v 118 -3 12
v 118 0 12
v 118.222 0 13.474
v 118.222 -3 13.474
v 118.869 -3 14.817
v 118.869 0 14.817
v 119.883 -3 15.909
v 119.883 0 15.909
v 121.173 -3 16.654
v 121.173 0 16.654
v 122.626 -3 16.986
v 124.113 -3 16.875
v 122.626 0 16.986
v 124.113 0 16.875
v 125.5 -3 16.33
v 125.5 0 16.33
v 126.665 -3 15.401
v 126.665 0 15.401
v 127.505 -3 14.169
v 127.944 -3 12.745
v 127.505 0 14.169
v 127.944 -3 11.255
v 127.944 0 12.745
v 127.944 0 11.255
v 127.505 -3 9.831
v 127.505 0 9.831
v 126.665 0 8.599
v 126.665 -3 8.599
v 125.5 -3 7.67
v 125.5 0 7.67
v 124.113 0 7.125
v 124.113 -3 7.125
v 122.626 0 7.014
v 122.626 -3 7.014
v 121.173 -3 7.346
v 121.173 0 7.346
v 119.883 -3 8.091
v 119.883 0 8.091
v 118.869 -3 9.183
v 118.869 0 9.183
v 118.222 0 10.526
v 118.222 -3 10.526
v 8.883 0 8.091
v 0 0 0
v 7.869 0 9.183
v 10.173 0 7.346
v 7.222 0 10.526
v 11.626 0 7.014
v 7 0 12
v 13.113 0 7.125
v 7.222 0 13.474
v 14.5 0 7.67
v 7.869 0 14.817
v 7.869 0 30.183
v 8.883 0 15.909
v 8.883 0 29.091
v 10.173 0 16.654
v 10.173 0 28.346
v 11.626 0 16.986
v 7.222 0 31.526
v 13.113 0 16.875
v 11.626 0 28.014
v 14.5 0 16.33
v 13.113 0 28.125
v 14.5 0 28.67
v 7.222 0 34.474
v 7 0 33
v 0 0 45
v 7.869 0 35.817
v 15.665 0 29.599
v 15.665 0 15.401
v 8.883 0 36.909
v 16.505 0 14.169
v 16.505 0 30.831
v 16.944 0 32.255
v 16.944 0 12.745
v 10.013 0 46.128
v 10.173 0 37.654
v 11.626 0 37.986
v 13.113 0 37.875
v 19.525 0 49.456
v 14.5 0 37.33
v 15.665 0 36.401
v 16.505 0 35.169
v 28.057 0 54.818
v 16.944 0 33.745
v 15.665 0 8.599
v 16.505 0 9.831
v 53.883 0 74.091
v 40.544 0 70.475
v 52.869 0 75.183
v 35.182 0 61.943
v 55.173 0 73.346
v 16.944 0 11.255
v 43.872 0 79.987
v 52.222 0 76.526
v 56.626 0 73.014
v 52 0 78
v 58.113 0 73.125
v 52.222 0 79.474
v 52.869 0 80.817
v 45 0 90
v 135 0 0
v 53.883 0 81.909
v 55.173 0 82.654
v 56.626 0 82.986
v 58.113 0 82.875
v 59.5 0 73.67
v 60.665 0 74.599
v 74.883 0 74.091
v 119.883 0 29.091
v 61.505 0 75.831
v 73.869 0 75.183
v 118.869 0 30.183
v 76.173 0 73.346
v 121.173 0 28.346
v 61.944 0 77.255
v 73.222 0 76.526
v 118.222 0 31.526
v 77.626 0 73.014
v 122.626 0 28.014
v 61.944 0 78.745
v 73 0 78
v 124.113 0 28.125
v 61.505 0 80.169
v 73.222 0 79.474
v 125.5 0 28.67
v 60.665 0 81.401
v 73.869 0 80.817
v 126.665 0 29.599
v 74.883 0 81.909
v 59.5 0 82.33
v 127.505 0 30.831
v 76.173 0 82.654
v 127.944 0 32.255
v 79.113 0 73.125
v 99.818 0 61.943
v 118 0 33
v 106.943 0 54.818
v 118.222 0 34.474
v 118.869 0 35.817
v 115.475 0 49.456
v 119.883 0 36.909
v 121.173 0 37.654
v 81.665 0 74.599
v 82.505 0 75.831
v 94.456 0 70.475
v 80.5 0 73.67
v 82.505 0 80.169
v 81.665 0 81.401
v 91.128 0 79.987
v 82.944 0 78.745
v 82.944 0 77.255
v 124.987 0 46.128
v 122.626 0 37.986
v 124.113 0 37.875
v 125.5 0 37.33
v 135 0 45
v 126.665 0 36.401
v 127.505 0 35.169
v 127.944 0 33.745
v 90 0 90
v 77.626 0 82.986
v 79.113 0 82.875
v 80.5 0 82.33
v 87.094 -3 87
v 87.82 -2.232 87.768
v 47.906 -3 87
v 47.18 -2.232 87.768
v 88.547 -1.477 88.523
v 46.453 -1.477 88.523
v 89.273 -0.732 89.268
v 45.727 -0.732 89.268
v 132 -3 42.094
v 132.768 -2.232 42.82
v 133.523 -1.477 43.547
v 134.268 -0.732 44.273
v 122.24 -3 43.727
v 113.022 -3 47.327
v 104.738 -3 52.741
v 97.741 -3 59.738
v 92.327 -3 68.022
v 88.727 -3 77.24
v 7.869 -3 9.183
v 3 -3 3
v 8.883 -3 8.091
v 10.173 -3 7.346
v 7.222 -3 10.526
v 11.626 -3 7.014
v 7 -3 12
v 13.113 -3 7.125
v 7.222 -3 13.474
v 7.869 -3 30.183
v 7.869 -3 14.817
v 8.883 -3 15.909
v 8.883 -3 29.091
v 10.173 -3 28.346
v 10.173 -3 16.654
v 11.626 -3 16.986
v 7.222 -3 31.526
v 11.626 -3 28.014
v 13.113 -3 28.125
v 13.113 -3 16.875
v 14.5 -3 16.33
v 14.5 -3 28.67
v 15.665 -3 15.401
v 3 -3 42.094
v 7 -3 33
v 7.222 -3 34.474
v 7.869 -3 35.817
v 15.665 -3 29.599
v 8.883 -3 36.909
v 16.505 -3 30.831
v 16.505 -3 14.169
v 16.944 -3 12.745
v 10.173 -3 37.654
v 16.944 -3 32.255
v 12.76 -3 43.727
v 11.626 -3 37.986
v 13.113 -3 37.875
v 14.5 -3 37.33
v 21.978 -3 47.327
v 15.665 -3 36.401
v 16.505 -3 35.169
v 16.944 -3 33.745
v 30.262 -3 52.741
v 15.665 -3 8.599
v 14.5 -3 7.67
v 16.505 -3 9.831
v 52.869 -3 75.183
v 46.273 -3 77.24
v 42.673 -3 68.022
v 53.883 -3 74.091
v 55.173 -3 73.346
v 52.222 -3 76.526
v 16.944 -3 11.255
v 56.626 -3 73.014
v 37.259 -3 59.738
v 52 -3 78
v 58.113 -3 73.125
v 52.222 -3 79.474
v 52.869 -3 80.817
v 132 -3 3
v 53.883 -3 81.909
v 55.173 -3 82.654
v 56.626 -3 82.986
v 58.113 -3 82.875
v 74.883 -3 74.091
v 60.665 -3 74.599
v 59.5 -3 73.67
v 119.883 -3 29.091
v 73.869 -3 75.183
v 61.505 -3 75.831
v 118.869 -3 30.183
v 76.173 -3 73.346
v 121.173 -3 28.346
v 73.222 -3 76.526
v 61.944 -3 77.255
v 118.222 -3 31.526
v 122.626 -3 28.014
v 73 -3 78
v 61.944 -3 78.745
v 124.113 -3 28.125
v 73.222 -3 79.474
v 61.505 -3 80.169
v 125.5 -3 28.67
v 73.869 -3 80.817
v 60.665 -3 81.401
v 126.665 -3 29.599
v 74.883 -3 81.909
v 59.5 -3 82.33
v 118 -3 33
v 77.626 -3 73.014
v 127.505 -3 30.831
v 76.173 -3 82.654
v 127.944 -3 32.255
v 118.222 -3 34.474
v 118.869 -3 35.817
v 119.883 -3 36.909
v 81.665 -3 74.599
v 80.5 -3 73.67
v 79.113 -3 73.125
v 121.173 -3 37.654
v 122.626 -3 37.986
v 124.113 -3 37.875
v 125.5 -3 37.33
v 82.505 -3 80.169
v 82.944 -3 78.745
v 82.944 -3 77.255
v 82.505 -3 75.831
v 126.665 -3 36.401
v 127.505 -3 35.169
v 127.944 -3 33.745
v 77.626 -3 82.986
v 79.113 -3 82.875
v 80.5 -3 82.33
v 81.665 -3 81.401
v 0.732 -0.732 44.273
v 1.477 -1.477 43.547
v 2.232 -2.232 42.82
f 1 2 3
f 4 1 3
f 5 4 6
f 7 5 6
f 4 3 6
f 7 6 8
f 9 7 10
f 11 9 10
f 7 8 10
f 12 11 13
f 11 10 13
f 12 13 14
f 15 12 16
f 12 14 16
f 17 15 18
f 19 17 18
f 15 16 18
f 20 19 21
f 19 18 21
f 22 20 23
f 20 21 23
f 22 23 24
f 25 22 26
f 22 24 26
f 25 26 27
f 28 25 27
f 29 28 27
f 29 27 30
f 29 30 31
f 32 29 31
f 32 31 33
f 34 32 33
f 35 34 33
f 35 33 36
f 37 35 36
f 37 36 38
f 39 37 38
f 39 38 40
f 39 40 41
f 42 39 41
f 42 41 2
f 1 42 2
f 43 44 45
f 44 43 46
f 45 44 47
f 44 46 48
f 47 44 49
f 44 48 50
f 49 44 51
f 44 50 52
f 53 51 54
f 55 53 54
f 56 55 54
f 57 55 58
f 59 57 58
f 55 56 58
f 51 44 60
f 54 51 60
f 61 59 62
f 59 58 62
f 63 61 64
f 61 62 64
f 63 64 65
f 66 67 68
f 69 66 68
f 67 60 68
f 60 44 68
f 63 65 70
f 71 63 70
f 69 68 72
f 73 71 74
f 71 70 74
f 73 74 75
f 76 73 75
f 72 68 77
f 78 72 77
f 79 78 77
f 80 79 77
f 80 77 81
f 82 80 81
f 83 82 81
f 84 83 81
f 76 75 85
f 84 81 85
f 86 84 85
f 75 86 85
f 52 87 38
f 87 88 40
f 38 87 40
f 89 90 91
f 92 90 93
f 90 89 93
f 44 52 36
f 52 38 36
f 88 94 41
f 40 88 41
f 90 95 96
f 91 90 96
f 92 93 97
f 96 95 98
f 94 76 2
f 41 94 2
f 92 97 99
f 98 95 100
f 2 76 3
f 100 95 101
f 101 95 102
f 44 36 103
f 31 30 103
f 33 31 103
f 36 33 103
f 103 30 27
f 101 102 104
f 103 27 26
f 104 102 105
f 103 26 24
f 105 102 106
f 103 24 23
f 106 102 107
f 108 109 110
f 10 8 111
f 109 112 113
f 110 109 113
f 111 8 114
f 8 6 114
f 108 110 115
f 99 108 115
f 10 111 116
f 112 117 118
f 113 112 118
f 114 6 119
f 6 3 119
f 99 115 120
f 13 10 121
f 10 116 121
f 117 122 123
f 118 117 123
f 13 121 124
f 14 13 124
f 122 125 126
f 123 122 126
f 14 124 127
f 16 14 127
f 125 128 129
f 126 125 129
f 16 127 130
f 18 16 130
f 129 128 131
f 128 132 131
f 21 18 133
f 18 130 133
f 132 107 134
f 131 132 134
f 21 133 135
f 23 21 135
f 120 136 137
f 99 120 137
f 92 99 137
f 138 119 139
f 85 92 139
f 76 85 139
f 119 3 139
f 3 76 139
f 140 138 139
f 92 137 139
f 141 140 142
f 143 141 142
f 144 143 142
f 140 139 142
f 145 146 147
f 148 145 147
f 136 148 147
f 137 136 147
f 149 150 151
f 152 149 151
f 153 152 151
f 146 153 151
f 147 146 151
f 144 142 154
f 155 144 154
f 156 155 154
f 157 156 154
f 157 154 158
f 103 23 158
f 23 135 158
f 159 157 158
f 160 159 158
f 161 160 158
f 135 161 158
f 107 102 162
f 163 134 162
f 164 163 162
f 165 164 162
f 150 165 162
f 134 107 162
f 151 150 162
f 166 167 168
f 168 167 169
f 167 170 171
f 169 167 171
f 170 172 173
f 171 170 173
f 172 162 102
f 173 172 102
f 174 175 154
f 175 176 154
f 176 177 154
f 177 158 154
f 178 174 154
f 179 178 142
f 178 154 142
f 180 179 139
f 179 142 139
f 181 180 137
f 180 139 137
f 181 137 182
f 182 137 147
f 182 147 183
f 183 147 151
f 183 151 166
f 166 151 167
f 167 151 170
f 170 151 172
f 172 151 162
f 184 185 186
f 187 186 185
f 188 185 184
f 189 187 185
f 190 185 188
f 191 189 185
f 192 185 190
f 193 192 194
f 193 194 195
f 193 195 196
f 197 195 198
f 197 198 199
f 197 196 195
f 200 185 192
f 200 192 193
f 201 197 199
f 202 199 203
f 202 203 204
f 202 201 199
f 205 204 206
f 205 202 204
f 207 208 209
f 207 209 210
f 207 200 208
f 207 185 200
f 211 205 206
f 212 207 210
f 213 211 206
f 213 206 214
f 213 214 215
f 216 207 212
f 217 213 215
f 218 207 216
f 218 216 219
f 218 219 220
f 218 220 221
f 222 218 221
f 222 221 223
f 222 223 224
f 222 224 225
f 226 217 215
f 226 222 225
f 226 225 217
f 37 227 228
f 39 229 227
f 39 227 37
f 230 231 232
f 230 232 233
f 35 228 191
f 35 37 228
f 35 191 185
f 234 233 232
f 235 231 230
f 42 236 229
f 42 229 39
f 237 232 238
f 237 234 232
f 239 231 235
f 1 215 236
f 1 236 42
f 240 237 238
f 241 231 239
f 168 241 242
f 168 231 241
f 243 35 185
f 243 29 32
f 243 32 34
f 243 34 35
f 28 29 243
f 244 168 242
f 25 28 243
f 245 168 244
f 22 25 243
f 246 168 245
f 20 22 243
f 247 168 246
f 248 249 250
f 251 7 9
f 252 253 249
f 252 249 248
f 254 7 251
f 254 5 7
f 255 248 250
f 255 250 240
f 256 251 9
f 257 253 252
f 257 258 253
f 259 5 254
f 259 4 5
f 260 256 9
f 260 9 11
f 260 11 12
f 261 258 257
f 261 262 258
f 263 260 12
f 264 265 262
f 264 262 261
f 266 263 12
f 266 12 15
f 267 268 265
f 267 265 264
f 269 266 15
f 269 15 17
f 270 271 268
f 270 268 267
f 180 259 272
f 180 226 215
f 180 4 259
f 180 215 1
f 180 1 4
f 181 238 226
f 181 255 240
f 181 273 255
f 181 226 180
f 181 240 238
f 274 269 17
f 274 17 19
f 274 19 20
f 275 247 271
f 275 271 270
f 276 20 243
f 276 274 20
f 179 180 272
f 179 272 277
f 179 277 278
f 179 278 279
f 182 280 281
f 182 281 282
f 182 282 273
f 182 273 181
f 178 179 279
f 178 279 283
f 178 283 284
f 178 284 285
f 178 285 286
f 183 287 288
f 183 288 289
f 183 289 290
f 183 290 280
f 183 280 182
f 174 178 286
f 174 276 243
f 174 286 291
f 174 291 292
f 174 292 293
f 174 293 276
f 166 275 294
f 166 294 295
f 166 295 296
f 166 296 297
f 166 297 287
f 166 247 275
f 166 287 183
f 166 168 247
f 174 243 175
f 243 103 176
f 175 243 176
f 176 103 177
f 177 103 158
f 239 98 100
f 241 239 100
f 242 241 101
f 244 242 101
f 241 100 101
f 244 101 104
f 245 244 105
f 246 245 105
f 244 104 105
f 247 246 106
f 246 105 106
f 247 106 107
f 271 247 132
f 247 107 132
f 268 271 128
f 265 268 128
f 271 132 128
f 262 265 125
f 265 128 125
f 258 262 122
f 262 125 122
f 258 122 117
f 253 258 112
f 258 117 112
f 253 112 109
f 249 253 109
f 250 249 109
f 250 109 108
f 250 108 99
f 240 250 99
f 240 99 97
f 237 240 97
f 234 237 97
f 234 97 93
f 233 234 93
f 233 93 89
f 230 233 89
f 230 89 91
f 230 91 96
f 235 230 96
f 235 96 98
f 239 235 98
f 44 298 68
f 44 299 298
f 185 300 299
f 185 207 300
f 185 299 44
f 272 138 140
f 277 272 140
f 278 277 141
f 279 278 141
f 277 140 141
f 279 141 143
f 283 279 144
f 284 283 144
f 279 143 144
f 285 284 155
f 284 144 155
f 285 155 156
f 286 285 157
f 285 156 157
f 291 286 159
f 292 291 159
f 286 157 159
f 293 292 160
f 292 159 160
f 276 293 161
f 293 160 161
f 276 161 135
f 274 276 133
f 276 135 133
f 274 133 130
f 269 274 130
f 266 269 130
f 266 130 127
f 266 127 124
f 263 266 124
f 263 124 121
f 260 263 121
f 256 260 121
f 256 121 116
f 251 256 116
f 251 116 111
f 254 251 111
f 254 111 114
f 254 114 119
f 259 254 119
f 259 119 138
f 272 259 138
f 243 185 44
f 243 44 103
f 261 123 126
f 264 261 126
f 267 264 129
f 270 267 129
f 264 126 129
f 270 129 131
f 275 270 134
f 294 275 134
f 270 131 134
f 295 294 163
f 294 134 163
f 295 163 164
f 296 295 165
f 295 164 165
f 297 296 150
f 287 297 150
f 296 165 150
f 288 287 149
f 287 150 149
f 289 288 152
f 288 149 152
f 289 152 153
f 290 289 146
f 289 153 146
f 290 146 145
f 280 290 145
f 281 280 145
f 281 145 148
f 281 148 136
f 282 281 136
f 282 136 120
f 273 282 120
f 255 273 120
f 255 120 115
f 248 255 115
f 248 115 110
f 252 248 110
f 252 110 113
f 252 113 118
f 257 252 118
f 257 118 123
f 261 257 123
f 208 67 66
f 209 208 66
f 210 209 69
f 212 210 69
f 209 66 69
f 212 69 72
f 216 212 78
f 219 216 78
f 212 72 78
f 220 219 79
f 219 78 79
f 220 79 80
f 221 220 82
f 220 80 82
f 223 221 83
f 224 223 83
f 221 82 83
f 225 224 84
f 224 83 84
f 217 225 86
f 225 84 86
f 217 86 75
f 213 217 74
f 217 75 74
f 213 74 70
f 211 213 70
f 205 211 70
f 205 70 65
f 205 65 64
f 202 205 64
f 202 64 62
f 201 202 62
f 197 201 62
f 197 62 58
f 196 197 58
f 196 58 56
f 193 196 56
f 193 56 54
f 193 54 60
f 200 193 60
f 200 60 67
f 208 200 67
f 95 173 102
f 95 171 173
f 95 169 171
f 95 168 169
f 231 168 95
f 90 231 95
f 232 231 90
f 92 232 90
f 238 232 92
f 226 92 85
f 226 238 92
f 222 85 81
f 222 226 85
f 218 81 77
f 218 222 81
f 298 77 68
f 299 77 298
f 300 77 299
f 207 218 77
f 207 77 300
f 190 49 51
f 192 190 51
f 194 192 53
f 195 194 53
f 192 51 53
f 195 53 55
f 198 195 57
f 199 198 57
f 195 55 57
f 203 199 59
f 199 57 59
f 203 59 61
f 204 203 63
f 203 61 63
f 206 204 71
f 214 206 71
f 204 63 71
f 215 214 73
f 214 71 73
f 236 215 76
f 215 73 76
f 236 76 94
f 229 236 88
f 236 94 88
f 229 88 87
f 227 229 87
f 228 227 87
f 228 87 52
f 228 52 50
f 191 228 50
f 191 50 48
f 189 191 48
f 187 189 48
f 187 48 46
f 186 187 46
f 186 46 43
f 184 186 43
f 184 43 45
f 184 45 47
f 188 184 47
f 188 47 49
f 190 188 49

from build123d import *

# Parameters (mm, degrees)
F1_DEPTH = 3
F3_D     = 10
F3_DEPTH = 9
F3_TIP   = 3.0043030951
F4_SIZE  = 2.99999


# Not quite as in the source:
# - a fillet or chamfer is up to 0.001 mm smaller than in the source, because OpenCascade refuses the exact size


with BuildPart() as f1:
    # F0 (on Front) → F1 (new body)
    with BuildSketch(Plane.XZ):
        with BuildLine():
            Line((0, 45), (0, 0))
            Line((0, 0), (135, 0))
            Line((135, 0), (135, 45))
            ThreePointArc((135, 45), (103.1801948466, 58.1801948466), (90, 90))
            Line((90, 90), (45, 90))
            ThreePointArc((45, 90), (31.8198051534, 58.1801948466), (0, 45))
        make_face()
    extrude(amount=F1_DEPTH)

    # F3
    with Locations(Plane.XZ.offset(3)):
        with Locations((57, 78), (78, 78), (123, 33), (123, 12), (12, 12), (12, 33)):
            Hole(F3_D / 2, depth=F3_DEPTH)
            with Locations((0, 0, -(F3_DEPTH + F3_TIP / 2))):  # 118° drill point
                Cone(0, F3_D / 2, F3_TIP, mode=Mode.SUBTRACT)

    # F4 (size 3 in the source; OpenCascade refuses exactly that, so slightly less here)
    f4_edges = [f1.edges().sort_by_distance(p)[0] for p in [
        (31.819805, -3, 58.180195),
        (67.5, -3, 90),
        (103.180195, -3, 58.180195),
        (135, -3, 22.5),
        (0, -3, 22.5),
        (67.5, -3, 0),
    ]]
    chamfer(f4_edges, length=F4_SIZE)


solid = f1.part
